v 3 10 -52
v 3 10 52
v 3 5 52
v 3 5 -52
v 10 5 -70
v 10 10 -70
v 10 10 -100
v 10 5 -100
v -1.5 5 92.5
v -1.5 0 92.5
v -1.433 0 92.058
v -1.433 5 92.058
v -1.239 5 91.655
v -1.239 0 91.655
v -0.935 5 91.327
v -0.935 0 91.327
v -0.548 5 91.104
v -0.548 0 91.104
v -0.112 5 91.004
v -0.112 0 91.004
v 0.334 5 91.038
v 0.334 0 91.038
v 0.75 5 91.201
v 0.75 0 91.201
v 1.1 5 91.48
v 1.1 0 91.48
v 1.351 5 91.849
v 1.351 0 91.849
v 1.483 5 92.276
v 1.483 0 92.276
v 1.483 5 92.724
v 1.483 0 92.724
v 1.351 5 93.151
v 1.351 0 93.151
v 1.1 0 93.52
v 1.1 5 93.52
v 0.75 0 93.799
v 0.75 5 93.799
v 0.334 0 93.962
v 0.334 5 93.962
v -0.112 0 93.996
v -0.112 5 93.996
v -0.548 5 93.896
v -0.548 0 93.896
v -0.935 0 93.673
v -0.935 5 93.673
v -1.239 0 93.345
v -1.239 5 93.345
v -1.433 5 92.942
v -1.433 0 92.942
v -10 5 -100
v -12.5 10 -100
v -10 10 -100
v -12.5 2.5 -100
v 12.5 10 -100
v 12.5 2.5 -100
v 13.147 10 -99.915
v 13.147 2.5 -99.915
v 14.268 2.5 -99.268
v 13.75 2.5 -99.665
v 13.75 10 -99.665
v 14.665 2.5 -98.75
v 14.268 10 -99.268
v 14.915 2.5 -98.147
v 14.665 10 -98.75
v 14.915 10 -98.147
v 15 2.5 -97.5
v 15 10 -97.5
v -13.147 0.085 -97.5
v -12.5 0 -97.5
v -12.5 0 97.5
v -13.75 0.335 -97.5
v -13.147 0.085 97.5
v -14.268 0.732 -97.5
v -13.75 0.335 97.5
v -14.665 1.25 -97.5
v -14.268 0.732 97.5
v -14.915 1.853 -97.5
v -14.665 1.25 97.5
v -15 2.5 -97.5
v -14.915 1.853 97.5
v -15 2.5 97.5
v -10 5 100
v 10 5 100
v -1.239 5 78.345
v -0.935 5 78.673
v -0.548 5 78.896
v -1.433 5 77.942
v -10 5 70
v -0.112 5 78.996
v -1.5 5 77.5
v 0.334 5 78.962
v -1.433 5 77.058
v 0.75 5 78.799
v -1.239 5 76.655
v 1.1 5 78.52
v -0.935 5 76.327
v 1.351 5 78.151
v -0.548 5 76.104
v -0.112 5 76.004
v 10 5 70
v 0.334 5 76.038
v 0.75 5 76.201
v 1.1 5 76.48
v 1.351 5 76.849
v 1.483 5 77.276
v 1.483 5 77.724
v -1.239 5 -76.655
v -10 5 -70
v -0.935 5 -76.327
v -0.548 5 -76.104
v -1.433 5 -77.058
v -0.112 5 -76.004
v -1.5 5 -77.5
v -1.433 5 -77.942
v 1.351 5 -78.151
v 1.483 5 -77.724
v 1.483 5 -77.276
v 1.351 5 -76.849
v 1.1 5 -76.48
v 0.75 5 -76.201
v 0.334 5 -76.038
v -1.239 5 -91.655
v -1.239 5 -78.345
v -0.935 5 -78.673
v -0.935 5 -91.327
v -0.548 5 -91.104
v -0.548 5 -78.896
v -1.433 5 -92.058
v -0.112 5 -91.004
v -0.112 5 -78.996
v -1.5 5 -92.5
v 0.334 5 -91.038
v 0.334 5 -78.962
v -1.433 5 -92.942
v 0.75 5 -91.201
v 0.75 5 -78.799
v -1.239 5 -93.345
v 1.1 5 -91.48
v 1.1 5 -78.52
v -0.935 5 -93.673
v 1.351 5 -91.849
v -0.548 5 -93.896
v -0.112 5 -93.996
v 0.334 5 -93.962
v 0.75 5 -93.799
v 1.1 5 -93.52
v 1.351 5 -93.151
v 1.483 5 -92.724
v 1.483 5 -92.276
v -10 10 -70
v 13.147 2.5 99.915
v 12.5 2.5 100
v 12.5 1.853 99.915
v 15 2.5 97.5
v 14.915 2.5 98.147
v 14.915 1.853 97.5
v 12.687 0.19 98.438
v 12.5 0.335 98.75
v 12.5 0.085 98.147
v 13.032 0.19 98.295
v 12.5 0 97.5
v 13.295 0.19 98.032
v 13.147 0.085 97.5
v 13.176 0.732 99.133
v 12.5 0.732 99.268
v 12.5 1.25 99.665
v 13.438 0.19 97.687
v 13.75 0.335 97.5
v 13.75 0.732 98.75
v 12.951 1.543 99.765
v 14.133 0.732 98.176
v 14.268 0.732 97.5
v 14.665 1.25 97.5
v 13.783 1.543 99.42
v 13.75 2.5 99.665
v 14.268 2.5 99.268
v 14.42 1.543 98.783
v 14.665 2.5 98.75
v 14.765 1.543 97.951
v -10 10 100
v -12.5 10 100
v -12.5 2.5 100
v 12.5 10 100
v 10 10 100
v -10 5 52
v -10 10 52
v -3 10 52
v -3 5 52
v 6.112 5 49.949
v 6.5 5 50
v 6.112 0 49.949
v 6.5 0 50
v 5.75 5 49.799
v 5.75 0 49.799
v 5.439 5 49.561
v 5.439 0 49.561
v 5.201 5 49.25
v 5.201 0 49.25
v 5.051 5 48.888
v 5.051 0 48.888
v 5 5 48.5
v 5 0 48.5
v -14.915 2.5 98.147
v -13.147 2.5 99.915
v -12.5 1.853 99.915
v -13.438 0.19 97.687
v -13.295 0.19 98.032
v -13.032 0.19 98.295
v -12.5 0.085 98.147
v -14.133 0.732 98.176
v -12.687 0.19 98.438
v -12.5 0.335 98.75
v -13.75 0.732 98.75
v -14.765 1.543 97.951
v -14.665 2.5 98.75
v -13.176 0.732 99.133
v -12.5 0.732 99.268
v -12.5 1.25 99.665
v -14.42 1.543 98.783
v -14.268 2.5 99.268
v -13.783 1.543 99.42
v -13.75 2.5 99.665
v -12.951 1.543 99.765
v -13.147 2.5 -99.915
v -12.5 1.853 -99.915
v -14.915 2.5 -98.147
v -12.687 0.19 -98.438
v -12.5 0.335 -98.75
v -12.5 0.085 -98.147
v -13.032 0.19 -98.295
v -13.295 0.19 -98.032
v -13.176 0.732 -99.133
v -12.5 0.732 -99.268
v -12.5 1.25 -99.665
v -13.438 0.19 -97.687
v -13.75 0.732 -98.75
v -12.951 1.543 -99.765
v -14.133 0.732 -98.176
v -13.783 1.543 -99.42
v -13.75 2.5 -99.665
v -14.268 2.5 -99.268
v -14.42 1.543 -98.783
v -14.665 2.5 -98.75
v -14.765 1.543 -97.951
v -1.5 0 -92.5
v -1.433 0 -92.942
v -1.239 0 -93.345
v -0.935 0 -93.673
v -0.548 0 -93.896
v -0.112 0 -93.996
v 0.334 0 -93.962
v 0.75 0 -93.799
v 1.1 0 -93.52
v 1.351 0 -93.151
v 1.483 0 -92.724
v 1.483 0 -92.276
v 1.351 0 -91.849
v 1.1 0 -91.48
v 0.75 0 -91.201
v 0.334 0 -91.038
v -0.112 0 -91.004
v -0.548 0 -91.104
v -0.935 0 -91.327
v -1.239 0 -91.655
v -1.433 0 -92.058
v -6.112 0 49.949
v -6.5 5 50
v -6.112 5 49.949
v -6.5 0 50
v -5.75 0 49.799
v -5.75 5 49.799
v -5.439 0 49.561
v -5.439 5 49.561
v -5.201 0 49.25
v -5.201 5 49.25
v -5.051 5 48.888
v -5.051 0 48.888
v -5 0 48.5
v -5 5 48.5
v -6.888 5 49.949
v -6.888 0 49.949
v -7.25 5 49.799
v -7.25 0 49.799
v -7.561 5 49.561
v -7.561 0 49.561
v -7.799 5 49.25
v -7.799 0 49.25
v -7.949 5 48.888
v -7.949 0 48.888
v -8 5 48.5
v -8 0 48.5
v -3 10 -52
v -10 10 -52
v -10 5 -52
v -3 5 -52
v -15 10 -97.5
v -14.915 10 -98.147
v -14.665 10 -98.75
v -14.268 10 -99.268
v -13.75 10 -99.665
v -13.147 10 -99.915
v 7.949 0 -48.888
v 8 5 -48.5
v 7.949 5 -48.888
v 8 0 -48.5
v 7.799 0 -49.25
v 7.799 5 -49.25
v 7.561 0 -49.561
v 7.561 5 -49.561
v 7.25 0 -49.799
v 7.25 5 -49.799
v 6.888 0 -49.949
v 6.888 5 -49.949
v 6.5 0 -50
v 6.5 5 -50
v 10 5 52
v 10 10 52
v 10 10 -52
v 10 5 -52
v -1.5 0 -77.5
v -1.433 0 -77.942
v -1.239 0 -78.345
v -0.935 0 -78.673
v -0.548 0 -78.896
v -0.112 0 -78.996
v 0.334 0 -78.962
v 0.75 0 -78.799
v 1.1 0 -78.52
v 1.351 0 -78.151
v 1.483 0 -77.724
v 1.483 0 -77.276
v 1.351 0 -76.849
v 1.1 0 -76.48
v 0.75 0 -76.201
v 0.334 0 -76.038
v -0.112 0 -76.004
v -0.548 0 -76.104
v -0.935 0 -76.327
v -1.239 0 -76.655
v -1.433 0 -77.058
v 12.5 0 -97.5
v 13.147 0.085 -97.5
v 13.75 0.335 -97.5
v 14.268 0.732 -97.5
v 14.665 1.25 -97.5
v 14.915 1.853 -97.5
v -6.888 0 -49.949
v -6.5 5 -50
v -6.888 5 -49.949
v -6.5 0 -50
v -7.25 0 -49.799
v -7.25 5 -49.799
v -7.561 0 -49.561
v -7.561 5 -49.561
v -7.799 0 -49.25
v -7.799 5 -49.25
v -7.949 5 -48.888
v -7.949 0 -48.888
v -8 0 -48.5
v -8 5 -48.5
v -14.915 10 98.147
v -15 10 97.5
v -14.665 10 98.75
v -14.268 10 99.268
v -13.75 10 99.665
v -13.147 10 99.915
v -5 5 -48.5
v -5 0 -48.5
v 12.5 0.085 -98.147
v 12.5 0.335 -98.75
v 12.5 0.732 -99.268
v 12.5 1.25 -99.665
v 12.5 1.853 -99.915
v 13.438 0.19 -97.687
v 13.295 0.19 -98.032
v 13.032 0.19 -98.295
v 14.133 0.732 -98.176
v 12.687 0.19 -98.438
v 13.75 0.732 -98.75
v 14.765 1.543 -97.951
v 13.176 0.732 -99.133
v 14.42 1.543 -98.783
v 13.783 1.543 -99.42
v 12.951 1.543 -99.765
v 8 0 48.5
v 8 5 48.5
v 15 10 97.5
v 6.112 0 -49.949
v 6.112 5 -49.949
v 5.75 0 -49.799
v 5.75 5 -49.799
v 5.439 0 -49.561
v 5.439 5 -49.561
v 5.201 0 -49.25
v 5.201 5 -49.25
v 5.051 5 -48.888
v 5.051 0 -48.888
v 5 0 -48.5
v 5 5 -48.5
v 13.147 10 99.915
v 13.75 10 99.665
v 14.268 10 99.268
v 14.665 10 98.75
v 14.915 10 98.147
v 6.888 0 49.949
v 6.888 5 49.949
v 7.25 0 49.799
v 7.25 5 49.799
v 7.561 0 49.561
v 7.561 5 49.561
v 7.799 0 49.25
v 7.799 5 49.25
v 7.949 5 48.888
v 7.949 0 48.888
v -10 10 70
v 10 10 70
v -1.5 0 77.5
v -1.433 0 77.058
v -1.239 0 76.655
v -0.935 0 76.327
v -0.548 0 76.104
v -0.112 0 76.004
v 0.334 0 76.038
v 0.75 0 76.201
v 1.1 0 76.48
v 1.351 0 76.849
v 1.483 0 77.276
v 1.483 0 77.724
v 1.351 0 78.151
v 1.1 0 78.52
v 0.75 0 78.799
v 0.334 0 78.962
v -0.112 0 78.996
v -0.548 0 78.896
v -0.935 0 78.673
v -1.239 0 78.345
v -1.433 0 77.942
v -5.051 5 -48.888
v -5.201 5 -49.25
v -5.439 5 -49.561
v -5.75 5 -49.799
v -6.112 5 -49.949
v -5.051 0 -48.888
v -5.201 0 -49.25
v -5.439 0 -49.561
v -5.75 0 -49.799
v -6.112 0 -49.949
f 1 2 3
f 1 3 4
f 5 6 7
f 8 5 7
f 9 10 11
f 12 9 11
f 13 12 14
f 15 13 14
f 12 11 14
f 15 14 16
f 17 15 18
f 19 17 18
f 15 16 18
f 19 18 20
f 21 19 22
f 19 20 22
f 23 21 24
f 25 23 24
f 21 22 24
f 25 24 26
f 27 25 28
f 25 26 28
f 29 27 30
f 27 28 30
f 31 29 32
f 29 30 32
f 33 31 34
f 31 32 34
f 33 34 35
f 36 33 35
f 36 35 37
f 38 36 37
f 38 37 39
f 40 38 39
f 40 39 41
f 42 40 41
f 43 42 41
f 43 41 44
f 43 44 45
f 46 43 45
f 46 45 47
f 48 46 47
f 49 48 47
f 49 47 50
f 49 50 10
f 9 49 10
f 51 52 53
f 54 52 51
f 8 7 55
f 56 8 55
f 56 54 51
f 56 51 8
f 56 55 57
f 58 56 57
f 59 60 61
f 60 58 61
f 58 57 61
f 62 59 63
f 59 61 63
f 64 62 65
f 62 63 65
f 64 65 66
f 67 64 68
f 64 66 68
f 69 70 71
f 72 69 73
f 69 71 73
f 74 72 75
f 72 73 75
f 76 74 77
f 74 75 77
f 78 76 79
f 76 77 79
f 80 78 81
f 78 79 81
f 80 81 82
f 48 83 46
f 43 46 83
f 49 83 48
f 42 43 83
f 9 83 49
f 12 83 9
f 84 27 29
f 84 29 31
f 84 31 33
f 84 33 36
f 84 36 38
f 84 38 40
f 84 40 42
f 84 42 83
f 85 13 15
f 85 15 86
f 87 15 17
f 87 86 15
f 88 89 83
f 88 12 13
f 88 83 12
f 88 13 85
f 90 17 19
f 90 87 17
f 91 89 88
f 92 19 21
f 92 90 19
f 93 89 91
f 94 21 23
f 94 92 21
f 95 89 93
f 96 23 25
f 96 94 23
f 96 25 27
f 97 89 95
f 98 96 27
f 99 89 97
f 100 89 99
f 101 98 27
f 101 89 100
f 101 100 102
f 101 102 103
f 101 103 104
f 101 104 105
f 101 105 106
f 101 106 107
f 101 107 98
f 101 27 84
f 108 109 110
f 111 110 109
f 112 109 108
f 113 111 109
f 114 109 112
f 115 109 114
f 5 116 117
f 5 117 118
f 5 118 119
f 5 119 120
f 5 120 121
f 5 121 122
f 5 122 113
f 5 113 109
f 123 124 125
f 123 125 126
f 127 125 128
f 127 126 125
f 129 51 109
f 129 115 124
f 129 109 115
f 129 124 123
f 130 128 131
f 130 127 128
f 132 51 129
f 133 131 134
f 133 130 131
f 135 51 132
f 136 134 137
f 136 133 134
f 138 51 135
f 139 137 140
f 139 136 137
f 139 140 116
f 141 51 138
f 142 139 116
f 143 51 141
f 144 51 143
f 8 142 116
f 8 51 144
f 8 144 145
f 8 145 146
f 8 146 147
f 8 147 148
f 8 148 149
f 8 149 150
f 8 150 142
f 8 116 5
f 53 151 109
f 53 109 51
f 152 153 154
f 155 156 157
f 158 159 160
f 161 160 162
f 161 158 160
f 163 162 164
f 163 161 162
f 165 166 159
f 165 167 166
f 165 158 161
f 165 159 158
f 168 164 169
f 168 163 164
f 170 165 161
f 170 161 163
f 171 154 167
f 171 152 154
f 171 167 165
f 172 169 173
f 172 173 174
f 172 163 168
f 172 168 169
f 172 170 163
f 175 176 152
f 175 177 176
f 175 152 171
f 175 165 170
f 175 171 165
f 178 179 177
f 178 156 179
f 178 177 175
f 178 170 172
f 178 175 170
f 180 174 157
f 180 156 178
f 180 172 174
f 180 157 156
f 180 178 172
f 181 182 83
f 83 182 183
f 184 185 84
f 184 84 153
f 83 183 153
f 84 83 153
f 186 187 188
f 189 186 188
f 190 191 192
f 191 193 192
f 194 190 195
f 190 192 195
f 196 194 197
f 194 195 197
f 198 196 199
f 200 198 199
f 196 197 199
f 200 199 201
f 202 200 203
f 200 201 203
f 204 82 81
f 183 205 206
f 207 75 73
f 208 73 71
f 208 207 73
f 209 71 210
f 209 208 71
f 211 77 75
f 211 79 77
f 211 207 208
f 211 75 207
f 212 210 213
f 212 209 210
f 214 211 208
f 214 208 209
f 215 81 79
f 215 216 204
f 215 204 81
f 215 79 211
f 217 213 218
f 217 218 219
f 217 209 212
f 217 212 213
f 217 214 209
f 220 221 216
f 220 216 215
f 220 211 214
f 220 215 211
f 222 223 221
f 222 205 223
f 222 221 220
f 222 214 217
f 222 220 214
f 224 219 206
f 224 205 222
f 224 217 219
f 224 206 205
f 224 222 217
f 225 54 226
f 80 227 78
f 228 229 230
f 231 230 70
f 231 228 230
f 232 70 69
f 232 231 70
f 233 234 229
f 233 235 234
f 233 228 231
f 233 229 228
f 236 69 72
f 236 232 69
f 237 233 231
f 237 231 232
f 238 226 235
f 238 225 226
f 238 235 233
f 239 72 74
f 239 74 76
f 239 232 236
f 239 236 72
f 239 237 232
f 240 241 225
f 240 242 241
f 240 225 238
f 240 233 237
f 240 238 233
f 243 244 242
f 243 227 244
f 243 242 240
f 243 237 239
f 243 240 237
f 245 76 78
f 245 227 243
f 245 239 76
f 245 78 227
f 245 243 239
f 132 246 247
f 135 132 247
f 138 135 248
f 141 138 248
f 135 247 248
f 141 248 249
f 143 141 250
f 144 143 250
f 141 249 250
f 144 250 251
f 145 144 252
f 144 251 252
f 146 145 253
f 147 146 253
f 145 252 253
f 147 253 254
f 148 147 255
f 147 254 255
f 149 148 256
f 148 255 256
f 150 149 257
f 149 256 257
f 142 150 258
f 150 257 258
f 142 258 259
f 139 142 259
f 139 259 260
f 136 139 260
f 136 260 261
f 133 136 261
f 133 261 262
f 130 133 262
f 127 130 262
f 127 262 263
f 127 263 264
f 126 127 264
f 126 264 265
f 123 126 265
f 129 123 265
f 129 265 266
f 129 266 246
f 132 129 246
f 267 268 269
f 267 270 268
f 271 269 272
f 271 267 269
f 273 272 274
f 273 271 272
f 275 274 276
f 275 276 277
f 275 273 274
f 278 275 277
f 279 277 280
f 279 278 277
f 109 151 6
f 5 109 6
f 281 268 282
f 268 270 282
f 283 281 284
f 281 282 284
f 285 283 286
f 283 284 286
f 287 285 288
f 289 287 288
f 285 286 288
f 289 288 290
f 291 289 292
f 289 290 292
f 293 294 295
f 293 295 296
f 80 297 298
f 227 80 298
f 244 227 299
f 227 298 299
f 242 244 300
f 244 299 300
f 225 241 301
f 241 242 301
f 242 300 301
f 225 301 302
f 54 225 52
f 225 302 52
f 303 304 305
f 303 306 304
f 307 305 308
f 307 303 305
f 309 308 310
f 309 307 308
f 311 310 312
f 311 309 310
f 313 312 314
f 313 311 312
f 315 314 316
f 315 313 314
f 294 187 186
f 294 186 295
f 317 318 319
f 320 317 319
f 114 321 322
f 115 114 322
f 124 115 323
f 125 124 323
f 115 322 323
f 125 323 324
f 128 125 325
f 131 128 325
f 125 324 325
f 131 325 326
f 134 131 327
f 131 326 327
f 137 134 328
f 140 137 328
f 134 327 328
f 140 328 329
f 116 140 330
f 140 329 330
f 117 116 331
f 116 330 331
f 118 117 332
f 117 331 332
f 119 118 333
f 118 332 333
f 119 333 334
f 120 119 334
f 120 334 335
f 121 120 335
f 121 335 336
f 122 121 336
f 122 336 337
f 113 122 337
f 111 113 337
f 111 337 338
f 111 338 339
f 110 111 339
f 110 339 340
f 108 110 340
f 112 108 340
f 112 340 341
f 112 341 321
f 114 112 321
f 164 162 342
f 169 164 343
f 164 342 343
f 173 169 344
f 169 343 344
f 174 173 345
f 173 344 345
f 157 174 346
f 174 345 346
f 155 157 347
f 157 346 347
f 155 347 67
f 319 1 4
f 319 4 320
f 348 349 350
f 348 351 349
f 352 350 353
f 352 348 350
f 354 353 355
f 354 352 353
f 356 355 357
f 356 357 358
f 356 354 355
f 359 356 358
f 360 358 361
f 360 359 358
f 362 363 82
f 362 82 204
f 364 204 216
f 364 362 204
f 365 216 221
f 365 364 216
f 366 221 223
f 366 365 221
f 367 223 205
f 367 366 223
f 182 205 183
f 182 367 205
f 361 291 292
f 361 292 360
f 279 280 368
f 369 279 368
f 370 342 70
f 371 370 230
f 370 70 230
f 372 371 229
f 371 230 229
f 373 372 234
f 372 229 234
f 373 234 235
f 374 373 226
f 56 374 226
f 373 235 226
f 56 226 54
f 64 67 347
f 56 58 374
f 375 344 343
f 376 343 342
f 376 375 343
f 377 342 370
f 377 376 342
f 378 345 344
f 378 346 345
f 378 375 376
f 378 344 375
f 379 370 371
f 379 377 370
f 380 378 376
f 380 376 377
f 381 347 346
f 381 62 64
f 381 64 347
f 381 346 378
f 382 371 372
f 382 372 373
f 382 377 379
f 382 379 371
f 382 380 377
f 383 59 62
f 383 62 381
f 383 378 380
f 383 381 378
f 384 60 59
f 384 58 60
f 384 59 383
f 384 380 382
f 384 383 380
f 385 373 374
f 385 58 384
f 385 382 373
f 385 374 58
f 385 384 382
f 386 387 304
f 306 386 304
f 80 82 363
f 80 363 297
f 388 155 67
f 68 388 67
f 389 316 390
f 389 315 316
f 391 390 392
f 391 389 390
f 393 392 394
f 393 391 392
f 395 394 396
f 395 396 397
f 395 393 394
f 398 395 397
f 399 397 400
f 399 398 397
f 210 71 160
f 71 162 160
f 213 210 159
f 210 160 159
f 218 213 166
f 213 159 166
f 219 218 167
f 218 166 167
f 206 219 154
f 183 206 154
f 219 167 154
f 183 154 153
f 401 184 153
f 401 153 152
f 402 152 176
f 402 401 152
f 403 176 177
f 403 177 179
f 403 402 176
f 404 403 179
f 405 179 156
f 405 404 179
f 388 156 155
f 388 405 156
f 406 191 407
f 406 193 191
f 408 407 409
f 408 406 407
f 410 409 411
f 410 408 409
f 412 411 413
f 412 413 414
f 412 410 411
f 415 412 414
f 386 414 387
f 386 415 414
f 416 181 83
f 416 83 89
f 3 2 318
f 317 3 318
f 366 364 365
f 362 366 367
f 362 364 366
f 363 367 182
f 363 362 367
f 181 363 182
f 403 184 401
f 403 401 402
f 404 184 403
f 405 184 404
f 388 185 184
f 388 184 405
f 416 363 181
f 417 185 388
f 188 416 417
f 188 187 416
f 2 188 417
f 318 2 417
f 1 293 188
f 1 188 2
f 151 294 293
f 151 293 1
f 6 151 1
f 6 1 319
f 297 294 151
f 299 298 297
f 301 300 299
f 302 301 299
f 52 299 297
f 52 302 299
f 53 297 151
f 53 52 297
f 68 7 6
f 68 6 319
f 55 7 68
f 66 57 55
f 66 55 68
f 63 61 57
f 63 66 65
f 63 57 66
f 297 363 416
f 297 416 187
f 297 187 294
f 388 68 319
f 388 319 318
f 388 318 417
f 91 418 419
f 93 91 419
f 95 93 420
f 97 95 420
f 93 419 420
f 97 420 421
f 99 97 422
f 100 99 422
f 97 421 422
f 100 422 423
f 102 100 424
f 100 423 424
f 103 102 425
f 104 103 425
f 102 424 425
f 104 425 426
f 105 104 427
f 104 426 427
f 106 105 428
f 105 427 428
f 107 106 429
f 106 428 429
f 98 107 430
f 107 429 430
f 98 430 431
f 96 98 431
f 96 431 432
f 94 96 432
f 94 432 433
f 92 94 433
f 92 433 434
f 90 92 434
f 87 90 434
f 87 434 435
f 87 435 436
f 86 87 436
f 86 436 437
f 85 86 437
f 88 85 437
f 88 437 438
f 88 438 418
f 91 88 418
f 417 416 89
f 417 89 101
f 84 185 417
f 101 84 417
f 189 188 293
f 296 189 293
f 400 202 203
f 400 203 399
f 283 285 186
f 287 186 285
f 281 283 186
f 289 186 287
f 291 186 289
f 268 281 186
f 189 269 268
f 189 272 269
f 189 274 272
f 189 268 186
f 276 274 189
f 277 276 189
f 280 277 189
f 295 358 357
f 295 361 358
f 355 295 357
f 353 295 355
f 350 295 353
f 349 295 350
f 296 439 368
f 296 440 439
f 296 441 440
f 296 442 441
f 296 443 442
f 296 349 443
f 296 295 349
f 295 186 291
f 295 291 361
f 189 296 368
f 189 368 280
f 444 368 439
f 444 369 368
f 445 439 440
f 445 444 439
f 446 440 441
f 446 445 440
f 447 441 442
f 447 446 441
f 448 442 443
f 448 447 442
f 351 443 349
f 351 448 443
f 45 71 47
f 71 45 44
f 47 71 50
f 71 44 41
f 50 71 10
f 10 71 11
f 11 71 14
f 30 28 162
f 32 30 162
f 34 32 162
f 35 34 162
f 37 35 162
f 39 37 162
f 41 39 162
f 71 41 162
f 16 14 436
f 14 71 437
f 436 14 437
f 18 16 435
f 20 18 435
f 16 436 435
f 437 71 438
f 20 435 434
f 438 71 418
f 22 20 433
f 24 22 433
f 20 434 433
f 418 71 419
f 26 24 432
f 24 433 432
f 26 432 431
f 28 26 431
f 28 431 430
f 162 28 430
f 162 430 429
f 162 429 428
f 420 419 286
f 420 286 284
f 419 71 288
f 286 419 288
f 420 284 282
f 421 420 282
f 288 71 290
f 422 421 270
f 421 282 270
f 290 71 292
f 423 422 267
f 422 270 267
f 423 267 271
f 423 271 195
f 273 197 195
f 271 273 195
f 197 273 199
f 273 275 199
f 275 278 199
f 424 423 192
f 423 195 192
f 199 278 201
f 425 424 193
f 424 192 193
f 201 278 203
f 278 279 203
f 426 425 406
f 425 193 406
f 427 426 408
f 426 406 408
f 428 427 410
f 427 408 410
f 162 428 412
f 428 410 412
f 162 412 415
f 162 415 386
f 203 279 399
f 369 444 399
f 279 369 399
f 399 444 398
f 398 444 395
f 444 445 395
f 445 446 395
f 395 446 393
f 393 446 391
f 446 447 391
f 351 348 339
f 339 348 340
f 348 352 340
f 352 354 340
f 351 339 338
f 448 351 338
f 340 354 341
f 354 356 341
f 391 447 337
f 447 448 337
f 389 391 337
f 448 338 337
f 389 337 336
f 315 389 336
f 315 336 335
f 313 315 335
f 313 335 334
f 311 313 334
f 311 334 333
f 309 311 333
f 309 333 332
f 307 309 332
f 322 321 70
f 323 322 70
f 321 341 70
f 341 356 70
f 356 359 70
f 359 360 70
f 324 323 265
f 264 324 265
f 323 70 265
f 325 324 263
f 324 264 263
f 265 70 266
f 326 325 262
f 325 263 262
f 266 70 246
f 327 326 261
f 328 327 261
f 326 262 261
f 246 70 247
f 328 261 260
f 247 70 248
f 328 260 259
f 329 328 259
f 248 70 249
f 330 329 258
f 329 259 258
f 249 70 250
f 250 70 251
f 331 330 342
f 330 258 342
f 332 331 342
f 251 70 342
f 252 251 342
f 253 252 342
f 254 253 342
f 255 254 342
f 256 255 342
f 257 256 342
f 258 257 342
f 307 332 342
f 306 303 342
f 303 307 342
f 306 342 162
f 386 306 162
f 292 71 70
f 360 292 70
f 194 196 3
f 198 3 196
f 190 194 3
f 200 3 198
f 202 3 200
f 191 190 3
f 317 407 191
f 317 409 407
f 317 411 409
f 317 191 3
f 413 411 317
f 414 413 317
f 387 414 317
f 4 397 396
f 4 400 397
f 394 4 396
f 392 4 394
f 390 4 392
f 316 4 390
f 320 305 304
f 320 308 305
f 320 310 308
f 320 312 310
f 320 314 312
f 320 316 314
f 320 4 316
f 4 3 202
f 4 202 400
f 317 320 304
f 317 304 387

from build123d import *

# Parameters (mm, degrees)
SKETCH2_W             = 30
SKETCH2_H             = 200
BOSS_EXTRUDE1_DEPTH   = 10
SKETCH3_W             = 20
SKETCH3_H             = 30
SKETCH3_W_2           = 7
SKETCH3_H_2           = 104
CUT_EXTRUDE1_DEPTH    = 5
FILLET1_R             = 2.5
FILLET2_R             = 2.5
SKETCH4_W             = 3
SKETCH4_H             = 100
CUT_EXTRUDE2_DEPTH    = 10
FILLET3_R             = 1.5
F_3_0MM_DOWEL_HOLE1_D = 3


with BuildPart() as part:
    # Sketch2 → Boss-Extrude1 (new body)
    with BuildSketch(Plane(origin=(0, 0, 0), x_dir=(1, 0, 0), z_dir=(0, 1, 0))):
        Rectangle(SKETCH2_W, SKETCH2_H)
    extrude(amount=BOSS_EXTRUDE1_DEPTH)

    # Sketch3 → Cut-Extrude1 (cut)
    with BuildSketch(Plane(origin=(0, 10, 0), x_dir=(1, 0, 0), z_dir=(0, 1, 0))):
        with Locations((0, 85)):
            Rectangle(SKETCH3_W, SKETCH3_H)
        with Locations((0, -85)):
            Rectangle(SKETCH3_W, SKETCH3_H)
        with Locations((6.5, 0)):
            Rectangle(SKETCH3_W_2, SKETCH3_H_2)
        with Locations((-6.5, 0)):
            Rectangle(SKETCH3_W_2, SKETCH3_H_2)
    extrude(amount=-CUT_EXTRUDE1_DEPTH, mode=Mode.SUBTRACT)

    # Fillet1
    fillet1_edges = [part.edges().sort_by_distance(p)[0] for p in [
        (15, 5, 100),
        (-15, 5, 100),
        (-15, 5, -100),
        (15, 5, -100),
    ]]
    fillet(fillet1_edges, radius=FILLET1_R)

    # Fillet2
    fillet2_edges = [part.edges().sort_by_distance(p)[0] for p in [
        (0, 0, 100),
        (15, 0, 0),
        (-15, 0, 0),
        (0, 0, -100),
        (14.267766953, 0, -99.267766953),
        (-14.267766953, 0, -99.267766953),
        (14.267766953, 0, 99.267766953),
        (-14.267766953, 0, 99.267766953),
    ]]
    fillet(fillet2_edges, radius=FILLET2_R)

    # Sketch4 → Cut-Extrude2 (cut)
    with BuildSketch(Plane(origin=(0, 10, 0), x_dir=(1, 0, 0), z_dir=(0, 1, 0))):
        with Locations((6.5, 0)):
            Rectangle(SKETCH4_W, SKETCH4_H)
        with Locations((-6.5, 0)):
            Rectangle(SKETCH4_W, SKETCH4_H)
    extrude(amount=-CUT_EXTRUDE2_DEPTH, mode=Mode.SUBTRACT)

    # Fillet3
    fillet3_edges = [part.edges().sort_by_distance(p)[0] for p in [
        (5, 2.5, 50),
        (8, 2.5, 50),
        (5, 2.5, -50),
        (8, 2.5, -50),
        (-5, 2.5, 50),
        (-8, 2.5, 50),
        (-8, 2.5, -50),
        (-5, 2.5, -50),
    ]]
    fillet(fillet3_edges, radius=FILLET3_R - 0.0001)  # a hair under: the kernel refuses the full size

    # Ø3.0mm Dowel Hole1 (through all)
    with Locations(Plane(origin=(0, 5, 0), x_dir=(1, 0, 0), z_dir=(0, 1, 0))):
        with Locations((0, 92.5), (0, 77.5), (0, -77.5), (0, -92.5)):
            Hole(F_3_0MM_DOWEL_HOLE1_D / 2)


solid = part.part
